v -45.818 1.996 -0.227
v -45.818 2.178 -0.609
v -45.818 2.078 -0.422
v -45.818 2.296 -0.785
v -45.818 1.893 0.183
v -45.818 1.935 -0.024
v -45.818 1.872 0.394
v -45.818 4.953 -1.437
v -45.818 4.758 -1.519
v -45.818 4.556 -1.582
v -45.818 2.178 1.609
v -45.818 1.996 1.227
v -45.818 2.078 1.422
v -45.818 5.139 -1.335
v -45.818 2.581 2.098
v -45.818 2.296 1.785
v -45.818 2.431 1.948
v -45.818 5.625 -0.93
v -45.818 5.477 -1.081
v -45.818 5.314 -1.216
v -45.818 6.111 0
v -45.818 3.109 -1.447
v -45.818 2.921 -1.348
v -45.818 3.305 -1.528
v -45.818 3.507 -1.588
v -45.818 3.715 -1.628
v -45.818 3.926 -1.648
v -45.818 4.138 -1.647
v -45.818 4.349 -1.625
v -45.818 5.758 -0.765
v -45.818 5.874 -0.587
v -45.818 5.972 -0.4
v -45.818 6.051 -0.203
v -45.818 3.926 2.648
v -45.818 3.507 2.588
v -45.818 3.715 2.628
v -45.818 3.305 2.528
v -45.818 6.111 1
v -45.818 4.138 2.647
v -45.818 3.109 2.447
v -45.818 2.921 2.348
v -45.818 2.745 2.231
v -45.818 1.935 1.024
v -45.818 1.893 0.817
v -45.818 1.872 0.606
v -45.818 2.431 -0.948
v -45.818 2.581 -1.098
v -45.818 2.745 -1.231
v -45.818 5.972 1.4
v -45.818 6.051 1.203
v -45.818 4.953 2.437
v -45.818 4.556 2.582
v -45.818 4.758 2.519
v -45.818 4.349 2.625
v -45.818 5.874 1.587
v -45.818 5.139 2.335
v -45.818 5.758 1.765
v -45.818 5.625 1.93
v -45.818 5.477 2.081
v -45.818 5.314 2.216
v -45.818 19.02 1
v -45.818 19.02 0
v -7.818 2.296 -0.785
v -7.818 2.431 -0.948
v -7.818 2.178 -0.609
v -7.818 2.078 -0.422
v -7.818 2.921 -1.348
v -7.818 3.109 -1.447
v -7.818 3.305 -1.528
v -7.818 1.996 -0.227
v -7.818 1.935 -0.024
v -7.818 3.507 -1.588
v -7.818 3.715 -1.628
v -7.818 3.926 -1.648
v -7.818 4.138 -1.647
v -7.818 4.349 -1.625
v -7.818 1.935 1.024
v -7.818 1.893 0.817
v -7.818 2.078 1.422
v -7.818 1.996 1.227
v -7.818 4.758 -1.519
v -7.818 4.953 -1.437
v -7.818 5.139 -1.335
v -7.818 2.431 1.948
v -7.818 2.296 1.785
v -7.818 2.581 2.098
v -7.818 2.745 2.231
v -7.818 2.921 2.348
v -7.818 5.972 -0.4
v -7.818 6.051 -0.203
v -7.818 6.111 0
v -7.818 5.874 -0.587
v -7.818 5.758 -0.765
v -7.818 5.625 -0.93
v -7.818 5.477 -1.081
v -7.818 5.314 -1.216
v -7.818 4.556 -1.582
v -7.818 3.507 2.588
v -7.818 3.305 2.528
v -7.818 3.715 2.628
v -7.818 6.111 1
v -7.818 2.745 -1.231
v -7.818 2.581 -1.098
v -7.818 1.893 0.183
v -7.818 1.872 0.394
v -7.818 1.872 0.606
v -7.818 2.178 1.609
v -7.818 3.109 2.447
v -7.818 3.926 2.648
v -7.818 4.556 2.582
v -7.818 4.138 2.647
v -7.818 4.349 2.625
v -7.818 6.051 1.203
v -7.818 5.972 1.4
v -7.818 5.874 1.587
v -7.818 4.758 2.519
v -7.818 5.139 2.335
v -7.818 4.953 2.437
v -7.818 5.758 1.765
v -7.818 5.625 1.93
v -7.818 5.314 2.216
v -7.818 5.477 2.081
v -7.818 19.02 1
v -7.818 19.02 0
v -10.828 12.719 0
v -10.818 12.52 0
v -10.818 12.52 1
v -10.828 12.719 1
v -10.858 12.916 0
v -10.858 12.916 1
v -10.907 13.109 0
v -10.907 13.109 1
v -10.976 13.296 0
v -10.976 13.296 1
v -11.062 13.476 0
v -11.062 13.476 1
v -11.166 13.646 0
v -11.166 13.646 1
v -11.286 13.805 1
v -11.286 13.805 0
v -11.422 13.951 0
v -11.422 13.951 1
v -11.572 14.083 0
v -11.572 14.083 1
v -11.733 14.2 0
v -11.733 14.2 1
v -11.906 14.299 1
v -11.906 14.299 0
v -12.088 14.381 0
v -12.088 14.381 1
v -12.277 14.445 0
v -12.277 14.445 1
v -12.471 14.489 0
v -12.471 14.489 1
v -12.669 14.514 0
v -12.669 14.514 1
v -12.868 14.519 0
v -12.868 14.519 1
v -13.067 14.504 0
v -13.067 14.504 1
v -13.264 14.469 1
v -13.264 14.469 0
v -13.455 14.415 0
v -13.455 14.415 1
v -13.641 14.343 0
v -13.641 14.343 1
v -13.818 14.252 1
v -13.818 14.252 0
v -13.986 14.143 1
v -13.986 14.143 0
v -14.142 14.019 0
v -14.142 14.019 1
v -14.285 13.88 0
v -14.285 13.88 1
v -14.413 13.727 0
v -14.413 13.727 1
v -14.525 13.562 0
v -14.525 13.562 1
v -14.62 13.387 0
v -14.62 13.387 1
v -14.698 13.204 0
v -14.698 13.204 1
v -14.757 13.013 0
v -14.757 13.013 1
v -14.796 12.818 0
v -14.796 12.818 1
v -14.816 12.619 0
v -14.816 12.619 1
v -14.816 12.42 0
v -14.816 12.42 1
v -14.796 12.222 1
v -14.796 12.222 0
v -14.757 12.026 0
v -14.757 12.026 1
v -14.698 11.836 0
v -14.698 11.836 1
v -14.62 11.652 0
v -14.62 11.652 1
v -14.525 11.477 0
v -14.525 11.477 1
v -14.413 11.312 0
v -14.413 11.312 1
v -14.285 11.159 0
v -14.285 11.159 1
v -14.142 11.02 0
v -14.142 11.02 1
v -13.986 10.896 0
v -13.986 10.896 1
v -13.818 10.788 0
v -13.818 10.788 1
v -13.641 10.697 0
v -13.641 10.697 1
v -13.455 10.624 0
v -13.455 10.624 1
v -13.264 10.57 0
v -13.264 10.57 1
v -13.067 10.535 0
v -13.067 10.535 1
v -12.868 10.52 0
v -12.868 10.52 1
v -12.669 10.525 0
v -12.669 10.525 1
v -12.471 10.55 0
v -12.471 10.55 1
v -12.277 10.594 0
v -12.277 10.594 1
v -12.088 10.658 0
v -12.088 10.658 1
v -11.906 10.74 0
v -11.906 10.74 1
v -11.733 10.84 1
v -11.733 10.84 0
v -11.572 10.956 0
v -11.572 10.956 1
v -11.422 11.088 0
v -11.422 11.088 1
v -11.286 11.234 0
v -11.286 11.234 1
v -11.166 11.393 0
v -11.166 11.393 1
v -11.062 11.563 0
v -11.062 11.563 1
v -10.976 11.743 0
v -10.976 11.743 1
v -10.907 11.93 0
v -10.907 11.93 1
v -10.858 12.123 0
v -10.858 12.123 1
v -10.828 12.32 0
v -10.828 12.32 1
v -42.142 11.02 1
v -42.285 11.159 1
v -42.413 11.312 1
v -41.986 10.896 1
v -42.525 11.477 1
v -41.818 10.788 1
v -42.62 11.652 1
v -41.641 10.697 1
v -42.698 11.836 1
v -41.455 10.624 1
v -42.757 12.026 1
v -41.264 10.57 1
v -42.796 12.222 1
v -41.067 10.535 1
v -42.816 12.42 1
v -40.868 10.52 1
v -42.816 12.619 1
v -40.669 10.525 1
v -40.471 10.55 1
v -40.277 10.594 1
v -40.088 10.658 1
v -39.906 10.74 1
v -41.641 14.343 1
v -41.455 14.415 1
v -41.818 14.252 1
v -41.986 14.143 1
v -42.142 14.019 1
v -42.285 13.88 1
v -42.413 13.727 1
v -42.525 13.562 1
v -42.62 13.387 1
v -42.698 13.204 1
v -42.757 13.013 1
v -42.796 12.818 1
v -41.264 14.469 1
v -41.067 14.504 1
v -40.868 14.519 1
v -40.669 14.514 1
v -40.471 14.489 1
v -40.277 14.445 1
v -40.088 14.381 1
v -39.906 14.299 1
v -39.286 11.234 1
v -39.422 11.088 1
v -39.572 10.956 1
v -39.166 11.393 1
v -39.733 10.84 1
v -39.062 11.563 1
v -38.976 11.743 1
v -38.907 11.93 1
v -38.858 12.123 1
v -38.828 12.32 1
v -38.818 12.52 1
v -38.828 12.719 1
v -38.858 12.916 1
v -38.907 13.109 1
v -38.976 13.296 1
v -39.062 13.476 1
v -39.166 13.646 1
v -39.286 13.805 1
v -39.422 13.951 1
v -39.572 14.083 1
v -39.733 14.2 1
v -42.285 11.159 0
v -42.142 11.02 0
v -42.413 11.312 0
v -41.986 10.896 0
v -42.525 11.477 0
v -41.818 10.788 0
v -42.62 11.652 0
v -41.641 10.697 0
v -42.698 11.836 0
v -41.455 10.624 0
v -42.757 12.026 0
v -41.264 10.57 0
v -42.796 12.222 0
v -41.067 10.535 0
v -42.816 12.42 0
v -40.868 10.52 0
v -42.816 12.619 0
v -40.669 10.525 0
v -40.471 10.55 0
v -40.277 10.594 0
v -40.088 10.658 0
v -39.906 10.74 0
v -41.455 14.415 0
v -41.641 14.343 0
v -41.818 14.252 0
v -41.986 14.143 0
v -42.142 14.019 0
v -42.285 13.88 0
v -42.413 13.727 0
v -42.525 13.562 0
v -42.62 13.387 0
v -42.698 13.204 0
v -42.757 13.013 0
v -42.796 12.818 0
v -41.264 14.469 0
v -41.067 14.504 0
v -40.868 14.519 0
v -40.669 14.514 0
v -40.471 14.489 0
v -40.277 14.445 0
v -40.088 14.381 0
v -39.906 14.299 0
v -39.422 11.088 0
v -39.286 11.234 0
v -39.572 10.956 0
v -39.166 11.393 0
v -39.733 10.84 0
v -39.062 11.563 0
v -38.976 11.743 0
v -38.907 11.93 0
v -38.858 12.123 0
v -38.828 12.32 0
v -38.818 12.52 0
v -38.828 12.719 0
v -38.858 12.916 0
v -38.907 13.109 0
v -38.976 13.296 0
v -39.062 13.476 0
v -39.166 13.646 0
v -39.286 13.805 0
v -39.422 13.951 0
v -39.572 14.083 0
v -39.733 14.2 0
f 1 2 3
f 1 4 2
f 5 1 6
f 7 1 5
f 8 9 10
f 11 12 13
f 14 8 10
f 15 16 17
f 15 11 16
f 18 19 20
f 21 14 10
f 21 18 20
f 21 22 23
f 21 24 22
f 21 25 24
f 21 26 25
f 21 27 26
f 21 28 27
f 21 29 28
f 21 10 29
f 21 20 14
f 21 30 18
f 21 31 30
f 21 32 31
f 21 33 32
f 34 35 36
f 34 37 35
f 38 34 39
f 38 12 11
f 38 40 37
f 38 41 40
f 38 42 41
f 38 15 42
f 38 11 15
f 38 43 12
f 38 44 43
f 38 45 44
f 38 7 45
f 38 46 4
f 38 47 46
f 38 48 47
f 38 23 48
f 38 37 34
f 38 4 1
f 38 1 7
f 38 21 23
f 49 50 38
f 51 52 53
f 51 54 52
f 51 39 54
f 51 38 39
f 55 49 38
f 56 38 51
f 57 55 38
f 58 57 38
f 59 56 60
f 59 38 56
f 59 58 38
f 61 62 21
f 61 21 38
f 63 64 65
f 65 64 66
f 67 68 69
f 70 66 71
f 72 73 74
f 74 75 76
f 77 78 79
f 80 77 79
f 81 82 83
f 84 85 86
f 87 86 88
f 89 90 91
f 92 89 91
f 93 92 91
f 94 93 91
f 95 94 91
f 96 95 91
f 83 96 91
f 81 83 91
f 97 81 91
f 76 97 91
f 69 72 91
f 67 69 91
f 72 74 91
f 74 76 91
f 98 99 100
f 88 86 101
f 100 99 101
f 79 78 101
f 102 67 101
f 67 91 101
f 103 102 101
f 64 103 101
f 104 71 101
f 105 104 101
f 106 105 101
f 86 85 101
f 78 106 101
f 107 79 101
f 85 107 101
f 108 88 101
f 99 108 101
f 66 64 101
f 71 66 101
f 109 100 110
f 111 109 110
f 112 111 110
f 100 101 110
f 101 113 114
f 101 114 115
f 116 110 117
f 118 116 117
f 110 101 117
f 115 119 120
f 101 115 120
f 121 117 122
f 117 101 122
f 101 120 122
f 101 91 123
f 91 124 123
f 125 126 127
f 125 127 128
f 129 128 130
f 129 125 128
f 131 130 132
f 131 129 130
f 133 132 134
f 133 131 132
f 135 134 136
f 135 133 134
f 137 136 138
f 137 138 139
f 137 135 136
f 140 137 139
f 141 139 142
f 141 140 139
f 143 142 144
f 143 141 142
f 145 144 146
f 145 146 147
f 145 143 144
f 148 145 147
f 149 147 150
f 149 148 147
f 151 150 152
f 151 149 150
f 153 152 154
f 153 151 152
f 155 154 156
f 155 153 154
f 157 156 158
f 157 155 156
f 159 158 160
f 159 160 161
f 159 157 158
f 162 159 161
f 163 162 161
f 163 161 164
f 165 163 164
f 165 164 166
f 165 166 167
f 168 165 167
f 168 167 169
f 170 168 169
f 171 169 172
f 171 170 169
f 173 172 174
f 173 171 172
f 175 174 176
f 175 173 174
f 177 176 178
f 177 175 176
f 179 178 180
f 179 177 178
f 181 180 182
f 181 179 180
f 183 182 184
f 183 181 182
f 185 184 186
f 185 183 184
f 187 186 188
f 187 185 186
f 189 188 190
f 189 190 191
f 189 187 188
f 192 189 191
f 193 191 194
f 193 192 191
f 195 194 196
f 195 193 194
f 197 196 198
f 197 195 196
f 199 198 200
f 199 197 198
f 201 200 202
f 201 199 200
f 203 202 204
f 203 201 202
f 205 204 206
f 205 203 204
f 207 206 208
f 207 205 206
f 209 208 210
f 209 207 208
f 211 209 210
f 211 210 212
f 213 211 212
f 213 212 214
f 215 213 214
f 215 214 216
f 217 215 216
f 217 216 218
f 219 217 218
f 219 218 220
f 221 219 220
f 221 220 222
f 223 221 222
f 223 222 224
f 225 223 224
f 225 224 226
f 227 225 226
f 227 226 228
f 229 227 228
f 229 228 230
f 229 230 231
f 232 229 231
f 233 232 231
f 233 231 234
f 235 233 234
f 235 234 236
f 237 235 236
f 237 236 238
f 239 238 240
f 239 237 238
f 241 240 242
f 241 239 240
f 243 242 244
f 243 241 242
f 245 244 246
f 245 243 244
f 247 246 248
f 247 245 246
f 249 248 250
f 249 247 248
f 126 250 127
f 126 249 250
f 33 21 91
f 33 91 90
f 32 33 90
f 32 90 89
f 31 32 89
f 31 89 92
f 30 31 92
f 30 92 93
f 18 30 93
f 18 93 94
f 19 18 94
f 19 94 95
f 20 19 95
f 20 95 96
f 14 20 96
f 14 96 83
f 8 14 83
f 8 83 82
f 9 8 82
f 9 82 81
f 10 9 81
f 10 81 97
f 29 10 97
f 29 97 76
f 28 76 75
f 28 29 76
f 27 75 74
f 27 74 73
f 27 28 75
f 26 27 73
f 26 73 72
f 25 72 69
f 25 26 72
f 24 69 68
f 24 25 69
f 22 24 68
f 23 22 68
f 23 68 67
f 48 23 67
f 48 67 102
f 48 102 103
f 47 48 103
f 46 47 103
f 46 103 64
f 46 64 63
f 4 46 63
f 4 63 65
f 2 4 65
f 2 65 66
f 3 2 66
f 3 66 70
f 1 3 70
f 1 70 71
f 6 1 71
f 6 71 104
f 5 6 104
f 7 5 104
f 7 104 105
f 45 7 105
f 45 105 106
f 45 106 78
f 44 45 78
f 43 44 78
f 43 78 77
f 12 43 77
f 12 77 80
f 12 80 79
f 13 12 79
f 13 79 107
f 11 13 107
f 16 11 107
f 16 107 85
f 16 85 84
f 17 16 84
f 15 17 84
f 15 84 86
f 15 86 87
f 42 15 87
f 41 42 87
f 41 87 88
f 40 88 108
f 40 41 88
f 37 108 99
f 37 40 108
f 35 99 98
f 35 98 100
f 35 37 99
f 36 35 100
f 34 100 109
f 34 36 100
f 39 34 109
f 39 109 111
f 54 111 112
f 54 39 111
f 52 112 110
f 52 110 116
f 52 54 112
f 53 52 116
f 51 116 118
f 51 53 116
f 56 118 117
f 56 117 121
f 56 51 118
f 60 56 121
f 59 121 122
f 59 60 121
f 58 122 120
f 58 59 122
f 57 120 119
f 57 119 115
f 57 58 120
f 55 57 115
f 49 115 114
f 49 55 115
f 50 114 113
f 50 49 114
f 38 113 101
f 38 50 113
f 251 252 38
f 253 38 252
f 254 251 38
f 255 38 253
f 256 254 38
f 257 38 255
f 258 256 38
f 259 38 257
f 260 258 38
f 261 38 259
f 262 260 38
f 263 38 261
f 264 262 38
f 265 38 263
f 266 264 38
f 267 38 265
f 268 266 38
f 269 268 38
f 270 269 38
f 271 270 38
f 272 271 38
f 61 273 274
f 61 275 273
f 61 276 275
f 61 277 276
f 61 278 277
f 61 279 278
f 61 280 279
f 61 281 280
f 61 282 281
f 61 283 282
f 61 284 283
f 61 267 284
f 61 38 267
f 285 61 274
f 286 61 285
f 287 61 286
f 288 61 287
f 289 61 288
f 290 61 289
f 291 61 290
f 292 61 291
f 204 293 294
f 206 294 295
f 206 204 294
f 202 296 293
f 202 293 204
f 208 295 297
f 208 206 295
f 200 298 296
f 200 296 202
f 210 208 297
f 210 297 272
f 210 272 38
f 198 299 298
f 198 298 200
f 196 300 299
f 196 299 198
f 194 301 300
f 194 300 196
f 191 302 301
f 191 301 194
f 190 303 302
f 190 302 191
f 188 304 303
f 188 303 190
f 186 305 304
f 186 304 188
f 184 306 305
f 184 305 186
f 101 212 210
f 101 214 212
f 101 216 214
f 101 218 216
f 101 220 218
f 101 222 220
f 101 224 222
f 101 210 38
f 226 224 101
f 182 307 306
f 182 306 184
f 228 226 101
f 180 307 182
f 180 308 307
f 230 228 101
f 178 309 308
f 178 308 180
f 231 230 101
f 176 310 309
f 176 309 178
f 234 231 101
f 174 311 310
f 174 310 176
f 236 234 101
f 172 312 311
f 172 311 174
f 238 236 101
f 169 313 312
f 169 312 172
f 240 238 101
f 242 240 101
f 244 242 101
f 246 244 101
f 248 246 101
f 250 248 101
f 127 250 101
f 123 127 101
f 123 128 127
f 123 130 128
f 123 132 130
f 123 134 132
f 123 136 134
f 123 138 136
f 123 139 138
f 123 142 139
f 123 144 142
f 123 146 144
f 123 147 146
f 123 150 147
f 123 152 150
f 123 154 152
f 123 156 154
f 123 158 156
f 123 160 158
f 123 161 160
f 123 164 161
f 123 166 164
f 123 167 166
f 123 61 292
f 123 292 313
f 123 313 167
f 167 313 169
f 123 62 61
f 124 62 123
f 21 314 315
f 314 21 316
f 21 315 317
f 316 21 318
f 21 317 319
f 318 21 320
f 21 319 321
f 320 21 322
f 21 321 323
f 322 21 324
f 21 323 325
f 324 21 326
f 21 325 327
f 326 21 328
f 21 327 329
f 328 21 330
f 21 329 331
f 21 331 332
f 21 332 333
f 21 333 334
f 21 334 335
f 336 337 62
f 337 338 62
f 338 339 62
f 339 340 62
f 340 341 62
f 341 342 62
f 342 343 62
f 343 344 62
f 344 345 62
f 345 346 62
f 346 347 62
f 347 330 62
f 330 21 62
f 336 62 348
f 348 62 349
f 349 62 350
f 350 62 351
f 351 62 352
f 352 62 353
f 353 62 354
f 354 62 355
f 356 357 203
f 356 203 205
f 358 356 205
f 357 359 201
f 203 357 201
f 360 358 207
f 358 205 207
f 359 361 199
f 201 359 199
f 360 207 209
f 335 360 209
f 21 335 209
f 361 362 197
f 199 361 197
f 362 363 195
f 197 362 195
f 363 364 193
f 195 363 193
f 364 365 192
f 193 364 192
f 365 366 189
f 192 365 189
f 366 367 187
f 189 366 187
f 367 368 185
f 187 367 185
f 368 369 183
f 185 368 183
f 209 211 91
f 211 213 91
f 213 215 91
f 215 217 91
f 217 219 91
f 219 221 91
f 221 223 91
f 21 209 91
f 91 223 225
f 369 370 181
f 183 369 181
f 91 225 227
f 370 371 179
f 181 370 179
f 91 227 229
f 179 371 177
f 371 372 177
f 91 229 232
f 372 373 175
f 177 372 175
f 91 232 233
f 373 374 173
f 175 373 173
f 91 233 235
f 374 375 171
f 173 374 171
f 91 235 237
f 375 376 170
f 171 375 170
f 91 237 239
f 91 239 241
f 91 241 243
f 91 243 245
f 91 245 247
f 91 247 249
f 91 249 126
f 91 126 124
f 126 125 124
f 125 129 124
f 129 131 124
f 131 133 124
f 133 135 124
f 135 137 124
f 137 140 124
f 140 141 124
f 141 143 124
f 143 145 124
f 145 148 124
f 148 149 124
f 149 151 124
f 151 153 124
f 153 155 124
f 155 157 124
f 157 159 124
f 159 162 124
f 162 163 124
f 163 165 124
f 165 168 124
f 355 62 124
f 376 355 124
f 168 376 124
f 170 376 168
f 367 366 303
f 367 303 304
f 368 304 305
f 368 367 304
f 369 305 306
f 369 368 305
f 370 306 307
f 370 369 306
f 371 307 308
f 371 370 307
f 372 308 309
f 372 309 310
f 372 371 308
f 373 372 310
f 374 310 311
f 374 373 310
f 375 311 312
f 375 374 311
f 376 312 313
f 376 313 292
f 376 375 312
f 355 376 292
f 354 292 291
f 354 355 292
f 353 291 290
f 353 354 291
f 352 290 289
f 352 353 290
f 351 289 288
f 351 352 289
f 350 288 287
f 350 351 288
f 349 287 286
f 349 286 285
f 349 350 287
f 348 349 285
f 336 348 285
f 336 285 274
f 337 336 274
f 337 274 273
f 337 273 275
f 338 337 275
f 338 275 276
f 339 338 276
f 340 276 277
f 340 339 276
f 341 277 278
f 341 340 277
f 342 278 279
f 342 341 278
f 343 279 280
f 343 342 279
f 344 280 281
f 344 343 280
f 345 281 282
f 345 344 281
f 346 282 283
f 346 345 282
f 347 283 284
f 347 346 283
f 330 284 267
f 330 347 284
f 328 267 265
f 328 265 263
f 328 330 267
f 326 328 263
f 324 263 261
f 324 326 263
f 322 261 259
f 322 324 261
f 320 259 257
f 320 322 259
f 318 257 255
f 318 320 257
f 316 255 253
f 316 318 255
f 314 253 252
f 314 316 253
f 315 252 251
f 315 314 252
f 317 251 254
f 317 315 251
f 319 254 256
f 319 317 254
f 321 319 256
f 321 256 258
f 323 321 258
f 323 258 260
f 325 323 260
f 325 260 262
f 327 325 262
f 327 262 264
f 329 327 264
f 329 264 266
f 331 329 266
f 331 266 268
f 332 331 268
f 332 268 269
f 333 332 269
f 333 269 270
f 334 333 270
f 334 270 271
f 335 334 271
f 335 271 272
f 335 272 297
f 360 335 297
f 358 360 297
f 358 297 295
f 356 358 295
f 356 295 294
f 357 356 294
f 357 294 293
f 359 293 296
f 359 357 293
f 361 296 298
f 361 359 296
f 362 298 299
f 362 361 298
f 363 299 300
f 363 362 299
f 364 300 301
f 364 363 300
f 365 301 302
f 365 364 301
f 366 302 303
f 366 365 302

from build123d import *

# Parameters (mm, degrees)
SKETCH_1_W          = 38
SKETCH_1_H          = 30
SKETCH_1_R          = 2
EXTRUDE_1_DEPTH     = 1
SKETCH_2_W          = 38
SKETCH_2_H          = 15
CUT_EXTRUDE_1_DEPTH = 1
SKETCH_4_R          = 2.15
EXTRUDE_2_DEPTH     = 38


with BuildPart() as part:
    # 草图1 → 凸台-拉伸1 (new body)
    with BuildSketch(Plane.XY):
        with Locations((-26.818488663, 4.019613274)):
            Rectangle(SKETCH_1_W, SKETCH_1_H)
        with Locations((-40.818488663, 12.519613274)):
            Circle(SKETCH_1_R, mode=Mode.SUBTRACT)
        with Locations((-12.818488663, 12.519613274)):
            Circle(SKETCH_1_R, mode=Mode.SUBTRACT)
        with Locations((-40.818488663, -4.480386726)):
            Circle(SKETCH_1_R, mode=Mode.SUBTRACT)
        with Locations((-12.818488663, -4.480386726)):
            Circle(SKETCH_1_R, mode=Mode.SUBTRACT)
    extrude(amount=EXTRUDE_1_DEPTH)

    # 草图2 → 切除-拉伸1 (cut)
    with BuildSketch(Plane.XY.offset(1)):
        with Locations((-26.818488663, -3.480386726)):
            Rectangle(SKETCH_2_W, SKETCH_2_H)
    extrude(amount=-CUT_EXTRUDE_1_DEPTH, mode=Mode.SUBTRACT)

    # 草图4 → 凸台-拉伸2 (add)
    with BuildSketch(Plane.ZY.offset(45.818488663)):
        with Locations((0.5, 4.019613274)):
            Circle(SKETCH_4_R)
    extrude(amount=-EXTRUDE_2_DEPTH)


solid = part.part
